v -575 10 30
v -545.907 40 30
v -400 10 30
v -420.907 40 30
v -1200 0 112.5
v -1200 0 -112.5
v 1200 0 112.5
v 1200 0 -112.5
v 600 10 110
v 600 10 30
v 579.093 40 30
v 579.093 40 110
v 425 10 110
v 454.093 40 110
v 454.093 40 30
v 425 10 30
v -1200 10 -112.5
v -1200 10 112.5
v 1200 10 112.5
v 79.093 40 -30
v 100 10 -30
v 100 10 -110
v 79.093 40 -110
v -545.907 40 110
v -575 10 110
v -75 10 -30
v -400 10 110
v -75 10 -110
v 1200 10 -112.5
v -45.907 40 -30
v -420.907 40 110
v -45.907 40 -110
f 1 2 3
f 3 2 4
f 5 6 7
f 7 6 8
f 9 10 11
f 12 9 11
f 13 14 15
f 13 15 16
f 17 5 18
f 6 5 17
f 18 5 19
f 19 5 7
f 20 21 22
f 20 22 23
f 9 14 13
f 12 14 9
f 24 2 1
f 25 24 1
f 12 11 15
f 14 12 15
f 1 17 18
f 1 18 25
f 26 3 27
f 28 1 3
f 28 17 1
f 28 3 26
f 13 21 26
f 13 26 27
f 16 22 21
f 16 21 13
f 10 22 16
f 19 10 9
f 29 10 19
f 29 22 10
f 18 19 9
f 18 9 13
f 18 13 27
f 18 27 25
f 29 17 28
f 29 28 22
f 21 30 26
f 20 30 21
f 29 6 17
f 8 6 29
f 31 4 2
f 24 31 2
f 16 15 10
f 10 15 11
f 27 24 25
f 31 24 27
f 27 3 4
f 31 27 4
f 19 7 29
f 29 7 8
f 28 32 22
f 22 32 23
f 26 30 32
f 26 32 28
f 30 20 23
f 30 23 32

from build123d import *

# Parameters (mm, degrees)
SKETCH1_W           = 2400
SKETCH1_H           = 225
BOSS_EXTRUDE1_DEPTH = 10
BOSS_EXTRUDE2_START = 30
BOSS_EXTRUDE2_DEPTH = 80
BOSS_EXTRUDE3_START = -30
BOSS_EXTRUDE3_DEPTH = 80


with BuildPart() as part:
    # Sketch1 → Boss-Extrude1 (new body)
    with BuildSketch(Plane(origin=(0, 0, 0), x_dir=(1, 0, 0), z_dir=(0, 1, 0))):
        Rectangle(SKETCH1_W, SKETCH1_H)
    extrude(amount=BOSS_EXTRUDE1_DEPTH)

    # Sketch2 → Boss-Extrude2 (add)
    with BuildSketch(Plane.XY.offset(BOSS_EXTRUDE2_START)):
        Polygon((600, 10), (579.09266135, 40), (454.09266135, 40), (425, 10), align=None)
        Polygon((-420.90733865, 40), (-545.90733865, 40), (-575, 10), (-400, 10), align=None)
    extrude(amount=BOSS_EXTRUDE2_DEPTH)

    # Sketch4 → Boss-Extrude3 (add)
    with BuildSketch(Plane.XY.offset(BOSS_EXTRUDE3_START)):
        Polygon((100, 10), (79.09266135, 40), (-45.90733865, 40), (-75, 10), align=None)
    extrude(amount=-BOSS_EXTRUDE3_DEPTH)


solid = part.part
